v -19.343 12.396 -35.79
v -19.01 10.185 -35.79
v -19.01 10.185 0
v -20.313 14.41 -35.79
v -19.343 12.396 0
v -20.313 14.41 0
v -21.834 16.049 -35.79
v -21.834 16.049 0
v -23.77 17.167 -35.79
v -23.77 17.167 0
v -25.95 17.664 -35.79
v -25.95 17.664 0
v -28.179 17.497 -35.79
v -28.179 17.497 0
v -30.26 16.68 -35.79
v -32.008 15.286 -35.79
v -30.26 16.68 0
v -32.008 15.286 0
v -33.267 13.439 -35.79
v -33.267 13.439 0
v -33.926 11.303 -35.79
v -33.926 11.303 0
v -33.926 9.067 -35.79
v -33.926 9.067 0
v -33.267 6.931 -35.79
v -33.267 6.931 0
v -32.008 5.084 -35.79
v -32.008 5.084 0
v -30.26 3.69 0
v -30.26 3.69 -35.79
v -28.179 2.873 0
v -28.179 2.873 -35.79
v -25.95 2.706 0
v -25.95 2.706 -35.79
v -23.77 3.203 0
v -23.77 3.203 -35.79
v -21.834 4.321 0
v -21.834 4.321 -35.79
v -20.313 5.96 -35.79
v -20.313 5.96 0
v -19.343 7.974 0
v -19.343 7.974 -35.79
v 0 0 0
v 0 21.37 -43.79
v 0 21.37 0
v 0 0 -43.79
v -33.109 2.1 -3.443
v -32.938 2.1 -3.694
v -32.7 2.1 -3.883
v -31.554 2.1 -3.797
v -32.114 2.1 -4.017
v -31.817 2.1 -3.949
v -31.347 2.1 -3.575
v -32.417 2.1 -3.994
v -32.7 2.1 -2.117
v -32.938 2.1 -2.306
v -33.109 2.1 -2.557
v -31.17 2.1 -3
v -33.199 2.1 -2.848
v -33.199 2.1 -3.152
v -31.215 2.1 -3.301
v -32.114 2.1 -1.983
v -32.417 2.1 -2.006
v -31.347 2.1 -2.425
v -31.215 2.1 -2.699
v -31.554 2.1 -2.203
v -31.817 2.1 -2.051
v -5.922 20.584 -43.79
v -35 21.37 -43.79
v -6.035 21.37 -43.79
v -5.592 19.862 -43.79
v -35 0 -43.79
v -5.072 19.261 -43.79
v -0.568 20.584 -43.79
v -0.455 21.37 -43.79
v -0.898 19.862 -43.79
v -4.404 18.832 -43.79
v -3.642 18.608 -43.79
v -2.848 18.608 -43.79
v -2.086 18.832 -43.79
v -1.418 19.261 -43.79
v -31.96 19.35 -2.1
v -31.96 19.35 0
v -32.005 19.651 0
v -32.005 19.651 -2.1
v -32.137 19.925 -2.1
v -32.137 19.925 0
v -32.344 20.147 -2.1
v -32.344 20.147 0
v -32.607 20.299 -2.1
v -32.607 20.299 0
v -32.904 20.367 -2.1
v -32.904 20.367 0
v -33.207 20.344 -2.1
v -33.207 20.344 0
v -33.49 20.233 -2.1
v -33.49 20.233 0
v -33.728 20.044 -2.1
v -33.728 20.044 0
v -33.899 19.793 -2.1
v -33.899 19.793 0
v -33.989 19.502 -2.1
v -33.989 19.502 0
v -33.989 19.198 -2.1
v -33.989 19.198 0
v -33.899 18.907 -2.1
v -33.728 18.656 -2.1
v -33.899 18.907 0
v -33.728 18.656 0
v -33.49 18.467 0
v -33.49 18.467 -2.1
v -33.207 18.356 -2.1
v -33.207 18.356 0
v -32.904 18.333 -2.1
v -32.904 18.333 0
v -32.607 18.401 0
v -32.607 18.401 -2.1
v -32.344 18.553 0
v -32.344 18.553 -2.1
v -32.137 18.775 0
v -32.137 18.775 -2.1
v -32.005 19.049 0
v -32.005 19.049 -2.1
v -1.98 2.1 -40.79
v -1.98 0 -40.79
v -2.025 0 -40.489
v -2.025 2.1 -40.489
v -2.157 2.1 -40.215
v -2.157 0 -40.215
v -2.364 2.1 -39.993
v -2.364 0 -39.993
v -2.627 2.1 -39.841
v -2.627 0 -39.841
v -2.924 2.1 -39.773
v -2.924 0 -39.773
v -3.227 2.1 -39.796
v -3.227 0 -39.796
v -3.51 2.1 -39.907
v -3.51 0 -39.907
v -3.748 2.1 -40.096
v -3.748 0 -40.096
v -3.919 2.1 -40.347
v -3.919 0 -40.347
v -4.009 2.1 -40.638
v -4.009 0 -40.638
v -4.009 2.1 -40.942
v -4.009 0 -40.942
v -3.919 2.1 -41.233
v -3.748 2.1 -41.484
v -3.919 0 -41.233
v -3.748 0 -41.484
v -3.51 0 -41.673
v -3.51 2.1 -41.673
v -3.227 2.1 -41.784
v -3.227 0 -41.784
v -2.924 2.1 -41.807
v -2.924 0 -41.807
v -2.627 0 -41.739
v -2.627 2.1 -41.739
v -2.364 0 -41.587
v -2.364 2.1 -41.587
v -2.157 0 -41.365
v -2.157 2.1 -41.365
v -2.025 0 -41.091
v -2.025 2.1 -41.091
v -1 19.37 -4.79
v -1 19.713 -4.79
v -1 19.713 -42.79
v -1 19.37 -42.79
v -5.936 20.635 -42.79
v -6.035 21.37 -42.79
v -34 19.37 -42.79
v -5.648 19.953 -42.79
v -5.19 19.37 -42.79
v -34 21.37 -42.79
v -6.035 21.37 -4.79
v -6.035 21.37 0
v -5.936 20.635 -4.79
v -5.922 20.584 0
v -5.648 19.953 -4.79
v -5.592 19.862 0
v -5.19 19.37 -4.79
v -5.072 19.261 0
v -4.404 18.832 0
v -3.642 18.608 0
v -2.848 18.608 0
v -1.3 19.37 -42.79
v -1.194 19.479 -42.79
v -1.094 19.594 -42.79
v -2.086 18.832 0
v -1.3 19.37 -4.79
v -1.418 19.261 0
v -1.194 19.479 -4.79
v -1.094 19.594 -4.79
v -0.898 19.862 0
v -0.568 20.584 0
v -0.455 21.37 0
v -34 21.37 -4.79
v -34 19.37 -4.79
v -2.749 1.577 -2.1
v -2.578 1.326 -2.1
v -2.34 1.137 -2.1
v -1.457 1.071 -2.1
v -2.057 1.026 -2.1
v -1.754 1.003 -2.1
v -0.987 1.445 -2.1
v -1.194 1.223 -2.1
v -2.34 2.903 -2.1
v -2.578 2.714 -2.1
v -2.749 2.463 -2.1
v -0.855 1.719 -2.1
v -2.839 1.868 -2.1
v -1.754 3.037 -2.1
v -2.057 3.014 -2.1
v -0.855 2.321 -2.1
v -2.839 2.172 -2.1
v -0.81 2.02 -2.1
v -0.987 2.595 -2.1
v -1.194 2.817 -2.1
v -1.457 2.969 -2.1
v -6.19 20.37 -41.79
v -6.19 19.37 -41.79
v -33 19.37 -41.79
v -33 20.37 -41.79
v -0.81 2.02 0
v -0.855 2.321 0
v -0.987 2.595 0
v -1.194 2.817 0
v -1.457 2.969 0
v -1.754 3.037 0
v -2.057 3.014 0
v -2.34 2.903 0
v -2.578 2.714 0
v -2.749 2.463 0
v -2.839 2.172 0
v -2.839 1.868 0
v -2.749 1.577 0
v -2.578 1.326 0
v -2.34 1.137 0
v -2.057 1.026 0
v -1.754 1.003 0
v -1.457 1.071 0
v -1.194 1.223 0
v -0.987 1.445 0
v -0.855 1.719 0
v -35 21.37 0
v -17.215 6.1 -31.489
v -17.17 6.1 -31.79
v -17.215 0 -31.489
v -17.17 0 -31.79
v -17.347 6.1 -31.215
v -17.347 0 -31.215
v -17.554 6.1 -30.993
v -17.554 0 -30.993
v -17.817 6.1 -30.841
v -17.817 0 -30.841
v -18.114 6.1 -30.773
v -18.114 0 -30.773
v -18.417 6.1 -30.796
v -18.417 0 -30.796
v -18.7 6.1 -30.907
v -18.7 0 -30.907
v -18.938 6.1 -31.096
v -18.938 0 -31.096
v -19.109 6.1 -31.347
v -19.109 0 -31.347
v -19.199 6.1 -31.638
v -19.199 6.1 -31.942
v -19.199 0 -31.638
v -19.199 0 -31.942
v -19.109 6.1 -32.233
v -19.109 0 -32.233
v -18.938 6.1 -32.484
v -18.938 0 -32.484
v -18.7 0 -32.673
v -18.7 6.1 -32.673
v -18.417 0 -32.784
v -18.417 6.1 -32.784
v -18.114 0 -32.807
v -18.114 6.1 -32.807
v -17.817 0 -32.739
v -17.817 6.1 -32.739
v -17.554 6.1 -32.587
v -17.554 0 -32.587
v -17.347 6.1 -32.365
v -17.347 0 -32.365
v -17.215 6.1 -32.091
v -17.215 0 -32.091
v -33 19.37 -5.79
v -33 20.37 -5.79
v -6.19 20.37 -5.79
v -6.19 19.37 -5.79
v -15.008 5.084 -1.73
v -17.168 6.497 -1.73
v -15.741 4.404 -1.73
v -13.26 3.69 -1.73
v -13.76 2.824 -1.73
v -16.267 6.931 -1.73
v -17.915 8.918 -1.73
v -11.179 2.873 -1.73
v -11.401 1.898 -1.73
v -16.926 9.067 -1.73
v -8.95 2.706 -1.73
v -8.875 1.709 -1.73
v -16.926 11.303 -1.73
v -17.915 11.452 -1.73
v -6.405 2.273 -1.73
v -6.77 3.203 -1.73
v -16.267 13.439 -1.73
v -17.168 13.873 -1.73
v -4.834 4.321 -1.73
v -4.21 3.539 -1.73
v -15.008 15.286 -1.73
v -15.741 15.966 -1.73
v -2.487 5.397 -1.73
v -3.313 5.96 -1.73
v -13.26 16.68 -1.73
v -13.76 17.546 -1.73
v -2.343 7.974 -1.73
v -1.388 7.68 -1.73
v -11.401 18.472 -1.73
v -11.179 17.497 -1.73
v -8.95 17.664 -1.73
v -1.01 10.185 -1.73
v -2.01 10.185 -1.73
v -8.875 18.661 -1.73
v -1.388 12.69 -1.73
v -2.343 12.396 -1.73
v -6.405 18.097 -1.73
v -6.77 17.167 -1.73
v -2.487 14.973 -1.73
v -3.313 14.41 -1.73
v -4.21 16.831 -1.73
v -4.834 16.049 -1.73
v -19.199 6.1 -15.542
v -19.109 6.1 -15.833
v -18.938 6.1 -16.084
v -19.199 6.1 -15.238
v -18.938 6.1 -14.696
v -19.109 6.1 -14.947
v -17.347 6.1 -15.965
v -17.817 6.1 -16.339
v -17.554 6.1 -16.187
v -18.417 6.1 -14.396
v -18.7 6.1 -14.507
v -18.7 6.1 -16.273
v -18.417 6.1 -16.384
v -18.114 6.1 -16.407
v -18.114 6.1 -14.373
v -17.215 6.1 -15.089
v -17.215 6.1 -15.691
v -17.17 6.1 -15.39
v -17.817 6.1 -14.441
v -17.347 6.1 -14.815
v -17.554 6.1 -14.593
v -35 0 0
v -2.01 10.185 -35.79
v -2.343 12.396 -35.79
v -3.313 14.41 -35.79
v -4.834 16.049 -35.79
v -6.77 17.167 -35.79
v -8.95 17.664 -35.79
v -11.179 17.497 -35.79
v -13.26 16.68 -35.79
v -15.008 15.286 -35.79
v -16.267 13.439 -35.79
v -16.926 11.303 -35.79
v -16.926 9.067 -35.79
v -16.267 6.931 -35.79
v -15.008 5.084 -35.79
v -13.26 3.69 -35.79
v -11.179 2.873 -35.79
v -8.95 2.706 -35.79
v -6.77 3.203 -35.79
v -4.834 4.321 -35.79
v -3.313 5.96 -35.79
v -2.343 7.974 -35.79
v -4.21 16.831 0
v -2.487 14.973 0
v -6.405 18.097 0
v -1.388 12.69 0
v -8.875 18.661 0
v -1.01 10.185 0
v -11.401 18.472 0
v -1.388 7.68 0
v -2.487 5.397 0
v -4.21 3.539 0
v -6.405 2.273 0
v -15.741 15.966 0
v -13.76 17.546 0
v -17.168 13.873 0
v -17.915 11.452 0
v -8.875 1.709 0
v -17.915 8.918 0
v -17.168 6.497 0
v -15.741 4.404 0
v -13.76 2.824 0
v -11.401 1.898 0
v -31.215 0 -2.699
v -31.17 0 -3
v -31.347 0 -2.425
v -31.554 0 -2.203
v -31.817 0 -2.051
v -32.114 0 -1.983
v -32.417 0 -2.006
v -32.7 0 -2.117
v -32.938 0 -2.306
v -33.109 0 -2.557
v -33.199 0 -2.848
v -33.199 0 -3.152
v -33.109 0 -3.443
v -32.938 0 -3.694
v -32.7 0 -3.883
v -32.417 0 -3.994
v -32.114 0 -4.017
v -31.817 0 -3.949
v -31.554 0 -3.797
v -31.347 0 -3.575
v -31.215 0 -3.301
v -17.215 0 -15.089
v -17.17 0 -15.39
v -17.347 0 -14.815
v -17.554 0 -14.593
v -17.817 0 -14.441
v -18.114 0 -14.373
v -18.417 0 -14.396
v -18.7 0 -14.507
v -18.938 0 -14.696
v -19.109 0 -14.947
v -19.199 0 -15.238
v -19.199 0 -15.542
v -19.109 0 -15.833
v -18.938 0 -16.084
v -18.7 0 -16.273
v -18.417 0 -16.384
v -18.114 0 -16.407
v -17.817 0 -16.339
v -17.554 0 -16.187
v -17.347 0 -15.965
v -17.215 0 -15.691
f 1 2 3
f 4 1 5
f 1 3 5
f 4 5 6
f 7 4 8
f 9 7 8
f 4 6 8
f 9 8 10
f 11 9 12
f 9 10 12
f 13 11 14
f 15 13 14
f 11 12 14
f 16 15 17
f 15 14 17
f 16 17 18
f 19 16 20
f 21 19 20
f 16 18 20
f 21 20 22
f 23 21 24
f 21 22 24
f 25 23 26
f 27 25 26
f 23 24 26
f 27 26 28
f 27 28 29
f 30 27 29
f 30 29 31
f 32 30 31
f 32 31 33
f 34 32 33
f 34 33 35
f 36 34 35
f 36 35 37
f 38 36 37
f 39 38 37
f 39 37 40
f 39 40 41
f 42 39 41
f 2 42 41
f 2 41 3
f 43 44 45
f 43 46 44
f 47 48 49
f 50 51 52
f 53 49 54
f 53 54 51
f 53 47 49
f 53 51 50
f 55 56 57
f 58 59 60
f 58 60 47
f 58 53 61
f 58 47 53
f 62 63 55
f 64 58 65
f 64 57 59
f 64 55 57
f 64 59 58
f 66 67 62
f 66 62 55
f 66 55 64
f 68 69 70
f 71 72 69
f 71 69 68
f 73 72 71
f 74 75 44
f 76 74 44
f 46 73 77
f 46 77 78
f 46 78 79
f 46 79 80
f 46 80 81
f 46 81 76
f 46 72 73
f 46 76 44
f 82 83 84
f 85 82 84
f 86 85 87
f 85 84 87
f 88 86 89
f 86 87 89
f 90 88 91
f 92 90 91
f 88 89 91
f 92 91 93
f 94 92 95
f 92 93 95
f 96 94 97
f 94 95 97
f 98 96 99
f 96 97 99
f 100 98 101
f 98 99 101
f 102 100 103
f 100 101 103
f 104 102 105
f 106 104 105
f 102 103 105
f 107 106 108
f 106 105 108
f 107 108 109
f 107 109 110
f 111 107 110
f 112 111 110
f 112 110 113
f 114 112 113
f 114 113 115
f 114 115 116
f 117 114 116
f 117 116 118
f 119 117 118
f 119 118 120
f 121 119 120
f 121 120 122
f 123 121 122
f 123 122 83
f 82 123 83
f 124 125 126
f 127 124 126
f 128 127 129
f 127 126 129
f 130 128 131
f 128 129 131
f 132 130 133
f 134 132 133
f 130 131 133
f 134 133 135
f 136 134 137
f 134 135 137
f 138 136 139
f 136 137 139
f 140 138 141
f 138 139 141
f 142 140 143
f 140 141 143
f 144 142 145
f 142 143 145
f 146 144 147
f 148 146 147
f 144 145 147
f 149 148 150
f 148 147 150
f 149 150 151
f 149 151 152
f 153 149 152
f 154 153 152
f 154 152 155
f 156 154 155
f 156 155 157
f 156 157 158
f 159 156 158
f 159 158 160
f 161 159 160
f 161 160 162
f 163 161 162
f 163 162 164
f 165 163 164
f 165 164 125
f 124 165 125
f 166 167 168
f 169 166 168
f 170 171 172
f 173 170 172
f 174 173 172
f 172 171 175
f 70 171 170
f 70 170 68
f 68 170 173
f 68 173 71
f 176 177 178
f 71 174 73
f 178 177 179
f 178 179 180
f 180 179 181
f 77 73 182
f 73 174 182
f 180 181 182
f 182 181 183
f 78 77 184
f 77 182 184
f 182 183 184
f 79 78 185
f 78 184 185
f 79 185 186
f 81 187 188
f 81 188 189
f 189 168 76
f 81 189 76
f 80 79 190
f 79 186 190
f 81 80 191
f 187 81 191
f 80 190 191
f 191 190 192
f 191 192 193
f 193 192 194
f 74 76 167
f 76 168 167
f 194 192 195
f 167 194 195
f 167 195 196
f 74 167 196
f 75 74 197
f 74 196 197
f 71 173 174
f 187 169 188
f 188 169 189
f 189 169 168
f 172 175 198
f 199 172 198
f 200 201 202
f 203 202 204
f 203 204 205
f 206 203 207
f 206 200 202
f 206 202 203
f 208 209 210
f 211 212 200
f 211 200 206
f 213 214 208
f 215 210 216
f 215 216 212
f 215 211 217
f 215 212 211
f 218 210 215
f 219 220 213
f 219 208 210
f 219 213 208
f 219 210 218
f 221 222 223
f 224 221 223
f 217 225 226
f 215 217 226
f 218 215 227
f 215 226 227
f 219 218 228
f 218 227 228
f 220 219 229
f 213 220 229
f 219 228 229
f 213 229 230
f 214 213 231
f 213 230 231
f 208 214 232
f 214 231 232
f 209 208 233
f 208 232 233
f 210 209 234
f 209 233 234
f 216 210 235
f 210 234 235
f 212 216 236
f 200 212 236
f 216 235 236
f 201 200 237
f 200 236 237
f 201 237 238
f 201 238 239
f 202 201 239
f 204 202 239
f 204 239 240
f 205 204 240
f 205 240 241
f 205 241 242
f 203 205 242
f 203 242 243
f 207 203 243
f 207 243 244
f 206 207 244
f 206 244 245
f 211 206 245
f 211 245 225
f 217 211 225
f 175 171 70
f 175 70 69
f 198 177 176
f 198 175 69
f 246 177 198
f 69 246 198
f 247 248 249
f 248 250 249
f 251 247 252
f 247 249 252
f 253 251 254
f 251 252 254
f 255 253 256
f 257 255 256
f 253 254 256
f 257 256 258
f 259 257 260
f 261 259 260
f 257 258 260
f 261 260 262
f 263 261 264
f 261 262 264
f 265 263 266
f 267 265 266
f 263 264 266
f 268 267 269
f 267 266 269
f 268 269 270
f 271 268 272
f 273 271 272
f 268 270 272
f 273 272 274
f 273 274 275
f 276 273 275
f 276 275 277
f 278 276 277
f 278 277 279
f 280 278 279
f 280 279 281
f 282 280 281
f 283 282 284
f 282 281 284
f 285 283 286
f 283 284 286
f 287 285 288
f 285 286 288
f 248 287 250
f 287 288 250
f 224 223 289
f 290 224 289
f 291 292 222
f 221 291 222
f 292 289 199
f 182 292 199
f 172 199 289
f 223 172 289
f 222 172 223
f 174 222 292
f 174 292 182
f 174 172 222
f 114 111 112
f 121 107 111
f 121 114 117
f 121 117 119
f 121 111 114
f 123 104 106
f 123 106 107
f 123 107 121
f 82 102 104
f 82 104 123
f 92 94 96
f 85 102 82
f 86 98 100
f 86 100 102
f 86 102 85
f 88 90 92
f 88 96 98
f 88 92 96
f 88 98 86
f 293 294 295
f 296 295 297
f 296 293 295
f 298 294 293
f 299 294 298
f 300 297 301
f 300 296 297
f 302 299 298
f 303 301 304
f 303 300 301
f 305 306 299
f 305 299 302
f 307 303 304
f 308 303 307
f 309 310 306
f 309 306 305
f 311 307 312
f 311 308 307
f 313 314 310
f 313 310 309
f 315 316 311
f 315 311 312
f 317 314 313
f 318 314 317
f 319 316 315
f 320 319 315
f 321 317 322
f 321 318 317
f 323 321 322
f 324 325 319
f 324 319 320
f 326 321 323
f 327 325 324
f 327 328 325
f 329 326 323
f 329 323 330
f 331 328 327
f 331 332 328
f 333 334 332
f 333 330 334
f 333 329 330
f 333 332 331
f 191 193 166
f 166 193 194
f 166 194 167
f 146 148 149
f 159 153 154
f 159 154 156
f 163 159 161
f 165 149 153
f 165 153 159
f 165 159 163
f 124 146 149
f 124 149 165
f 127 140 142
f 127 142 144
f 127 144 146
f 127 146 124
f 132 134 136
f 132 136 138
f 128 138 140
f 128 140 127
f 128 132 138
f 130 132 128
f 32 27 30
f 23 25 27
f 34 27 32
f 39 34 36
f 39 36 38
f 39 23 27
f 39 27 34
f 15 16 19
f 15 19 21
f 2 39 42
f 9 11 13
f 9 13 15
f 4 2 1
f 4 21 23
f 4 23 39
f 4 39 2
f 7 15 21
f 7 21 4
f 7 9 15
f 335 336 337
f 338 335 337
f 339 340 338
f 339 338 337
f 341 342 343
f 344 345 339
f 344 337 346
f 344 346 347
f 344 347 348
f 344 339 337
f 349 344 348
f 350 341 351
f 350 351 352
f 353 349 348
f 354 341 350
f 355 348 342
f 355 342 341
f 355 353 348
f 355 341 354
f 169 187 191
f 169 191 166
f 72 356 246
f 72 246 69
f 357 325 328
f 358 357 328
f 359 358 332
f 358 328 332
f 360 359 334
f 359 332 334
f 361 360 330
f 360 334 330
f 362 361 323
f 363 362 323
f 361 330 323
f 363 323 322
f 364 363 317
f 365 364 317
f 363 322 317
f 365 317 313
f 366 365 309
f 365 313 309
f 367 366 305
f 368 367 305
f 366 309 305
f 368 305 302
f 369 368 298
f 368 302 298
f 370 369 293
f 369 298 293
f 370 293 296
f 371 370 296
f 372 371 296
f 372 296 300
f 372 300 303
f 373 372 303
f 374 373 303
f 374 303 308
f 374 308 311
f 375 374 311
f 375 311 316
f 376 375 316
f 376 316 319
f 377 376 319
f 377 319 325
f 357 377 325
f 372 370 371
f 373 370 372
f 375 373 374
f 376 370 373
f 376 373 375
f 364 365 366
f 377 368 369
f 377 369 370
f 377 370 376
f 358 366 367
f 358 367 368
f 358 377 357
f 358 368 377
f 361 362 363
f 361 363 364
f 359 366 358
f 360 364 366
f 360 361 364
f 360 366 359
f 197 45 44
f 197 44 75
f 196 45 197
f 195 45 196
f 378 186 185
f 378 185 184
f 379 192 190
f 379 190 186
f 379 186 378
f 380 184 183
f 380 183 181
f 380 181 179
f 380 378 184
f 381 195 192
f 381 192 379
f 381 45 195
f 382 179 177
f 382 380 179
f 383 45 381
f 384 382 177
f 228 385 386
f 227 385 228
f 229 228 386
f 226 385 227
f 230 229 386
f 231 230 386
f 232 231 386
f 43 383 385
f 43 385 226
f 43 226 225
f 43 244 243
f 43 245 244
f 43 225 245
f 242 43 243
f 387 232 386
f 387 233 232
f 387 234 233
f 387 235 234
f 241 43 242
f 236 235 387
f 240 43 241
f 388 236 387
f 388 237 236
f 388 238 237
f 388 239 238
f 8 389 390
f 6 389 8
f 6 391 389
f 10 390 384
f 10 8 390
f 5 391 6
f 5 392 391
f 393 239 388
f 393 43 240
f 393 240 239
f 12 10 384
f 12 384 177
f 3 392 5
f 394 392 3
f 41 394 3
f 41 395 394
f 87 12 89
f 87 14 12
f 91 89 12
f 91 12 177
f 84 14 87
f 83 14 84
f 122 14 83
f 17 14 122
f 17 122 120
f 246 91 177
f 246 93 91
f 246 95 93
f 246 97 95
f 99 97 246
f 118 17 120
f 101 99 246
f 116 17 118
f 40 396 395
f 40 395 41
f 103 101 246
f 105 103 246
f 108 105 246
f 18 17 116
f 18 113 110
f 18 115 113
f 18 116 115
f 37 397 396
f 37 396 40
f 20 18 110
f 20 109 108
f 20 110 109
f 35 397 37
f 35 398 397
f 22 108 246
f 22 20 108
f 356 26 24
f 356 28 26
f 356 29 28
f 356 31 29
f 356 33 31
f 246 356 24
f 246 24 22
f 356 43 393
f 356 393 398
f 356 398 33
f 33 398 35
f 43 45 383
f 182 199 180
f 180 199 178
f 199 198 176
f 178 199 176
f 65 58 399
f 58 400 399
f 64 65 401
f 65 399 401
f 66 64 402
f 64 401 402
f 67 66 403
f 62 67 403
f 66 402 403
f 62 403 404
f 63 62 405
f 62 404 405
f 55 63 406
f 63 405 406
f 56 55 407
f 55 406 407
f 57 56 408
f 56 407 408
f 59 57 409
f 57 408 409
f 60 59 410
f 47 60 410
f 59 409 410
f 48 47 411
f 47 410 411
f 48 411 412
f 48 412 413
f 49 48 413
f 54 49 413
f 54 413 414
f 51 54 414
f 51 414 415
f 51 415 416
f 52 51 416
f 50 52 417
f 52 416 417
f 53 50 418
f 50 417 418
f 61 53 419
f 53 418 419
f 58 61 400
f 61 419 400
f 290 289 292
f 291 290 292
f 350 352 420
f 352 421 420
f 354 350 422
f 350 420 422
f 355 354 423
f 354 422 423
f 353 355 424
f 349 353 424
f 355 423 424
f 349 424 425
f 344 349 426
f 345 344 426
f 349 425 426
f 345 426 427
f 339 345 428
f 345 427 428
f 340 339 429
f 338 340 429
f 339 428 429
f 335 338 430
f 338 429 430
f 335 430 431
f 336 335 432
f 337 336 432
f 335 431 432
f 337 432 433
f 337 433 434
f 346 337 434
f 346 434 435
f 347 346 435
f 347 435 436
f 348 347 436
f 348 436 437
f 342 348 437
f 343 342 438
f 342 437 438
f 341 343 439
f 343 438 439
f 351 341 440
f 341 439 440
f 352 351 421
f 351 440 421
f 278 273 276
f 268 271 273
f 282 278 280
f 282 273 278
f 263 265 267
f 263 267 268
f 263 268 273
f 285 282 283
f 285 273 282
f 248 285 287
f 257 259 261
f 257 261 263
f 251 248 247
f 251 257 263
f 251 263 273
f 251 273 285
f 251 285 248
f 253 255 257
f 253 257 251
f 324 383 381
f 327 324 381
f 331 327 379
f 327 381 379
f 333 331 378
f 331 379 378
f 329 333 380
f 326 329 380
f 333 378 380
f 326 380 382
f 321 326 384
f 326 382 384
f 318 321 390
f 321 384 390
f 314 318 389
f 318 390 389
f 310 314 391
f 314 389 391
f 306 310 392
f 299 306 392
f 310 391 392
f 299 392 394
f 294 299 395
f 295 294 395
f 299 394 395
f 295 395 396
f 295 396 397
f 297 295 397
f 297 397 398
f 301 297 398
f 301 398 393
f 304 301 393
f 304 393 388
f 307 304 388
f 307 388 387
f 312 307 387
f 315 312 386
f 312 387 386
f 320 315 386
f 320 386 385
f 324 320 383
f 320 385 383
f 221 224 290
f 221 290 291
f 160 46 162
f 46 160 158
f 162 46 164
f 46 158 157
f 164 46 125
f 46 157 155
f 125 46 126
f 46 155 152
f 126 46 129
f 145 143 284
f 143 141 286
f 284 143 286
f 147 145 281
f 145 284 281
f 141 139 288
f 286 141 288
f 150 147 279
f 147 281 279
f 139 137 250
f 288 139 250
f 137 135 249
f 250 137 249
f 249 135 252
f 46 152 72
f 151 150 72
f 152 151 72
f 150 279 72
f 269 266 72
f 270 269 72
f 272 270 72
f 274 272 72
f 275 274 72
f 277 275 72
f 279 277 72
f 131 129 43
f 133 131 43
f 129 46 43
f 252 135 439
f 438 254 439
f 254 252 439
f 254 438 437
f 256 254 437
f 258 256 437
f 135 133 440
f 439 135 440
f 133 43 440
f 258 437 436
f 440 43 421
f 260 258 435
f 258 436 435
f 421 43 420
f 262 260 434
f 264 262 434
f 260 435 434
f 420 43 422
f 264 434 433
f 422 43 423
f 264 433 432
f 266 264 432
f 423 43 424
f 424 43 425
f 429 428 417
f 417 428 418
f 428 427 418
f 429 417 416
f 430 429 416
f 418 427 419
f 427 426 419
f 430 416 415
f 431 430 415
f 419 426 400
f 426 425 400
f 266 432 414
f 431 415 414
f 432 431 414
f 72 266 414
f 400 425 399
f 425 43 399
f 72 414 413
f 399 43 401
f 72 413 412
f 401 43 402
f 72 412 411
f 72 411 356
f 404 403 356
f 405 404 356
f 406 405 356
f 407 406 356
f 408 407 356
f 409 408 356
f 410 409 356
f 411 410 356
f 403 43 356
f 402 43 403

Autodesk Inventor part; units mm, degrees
ref_plane "YZ Plane" through (0, 0, 0) normal (1, 0, 0) x (0, 1, 0)
ref_plane "XZ Plane" through (0, 0, 0) normal (0, 1, 0) x (-1, 0, 0)
ref_plane "XY Plane" through (0, 0, 0) normal (0, 0, 1) x (1, 0, 0)
sketch "Sketch1" plane through (0, 0, 0) normal (0, 1, 0) x (-1, 0, 0)
  line L0 (0, 0) -> (35, 0)
  line L1 (35, 0) -> (35, -43.79)
  line L2 (35, -43.79) -> (0, -43.79)
  line L3 (0, -43.79) -> (0, 0)
  dimension "d0" = 35
  dimension "d1" = 43.79
extrude "Extrusion1" add sketch "Sketch1" along normal blind 21.37
sketch "Sketch2" plane through (-35, 0, 0) normal (0, 0, 1) x (1, 0, 0)
  circle A0 centre (8.49, 10.185) radius 7.5
  circle A1 centre (25.49, 10.185) radius 7.5
  point P0 (35, 0)
  dimension "d4" = 15
  dimension "d5" = 15
extrude "Extrusion2" cut sketch "Sketch2" against normal blind 35.79
sketch "Sketch3" plane through (-35, 0, 0) normal (0, 0, 1) x (1, 0, 0)
  circle A0 centre (25.49, 10.185) radius 7.5 projected
  circle A1 centre (25.49, 10.185) radius 8.5
  point P0 (35, 0)
  dimension "d9" = 17
extrude "Extrusion3" cut sketch "Sketch3" against normal blind 1.73
sketch "Sketch4" plane through (-35, 0, 0) normal (0, 0, 1) x (1, 0, 0)
  circle A0 centre (2.02, 19.35) radius 1.02
  circle A1 centre (33.17, 2.02) radius 1.02
  point P0 (35, 0)
  dimension "d12" = 2.04
  dimension "d13" = 2.04
extrude "Extrusion4" cut sketch "Sketch4" against normal blind 2.1
sketch "Sketch5" plane through (0, 0, 0) normal (0, -1, 0) x (1, 0, 0)
  circle A0 centre (-32.19, -3) radius 1.02
  circle A1 centre (-3, -40.79) radius 1.02
  point P0 (0, 0)
  dimension "d17" = 2.04
  dimension "d23" = 2.04
extrude "Extrusion5" cut sketch "Sketch5" against normal blind 2.1
sketch "Sketch6" plane through (0, 0, 0) normal (0, -1, 0) x (1, 0, 0)
  circle A0 centre (-18.19, -15.39) radius 1.02
  circle A1 centre (-18.19, -31.79) radius 1.02
  point P0 (0, 0)
  dimension "d20" = 2.04
  dimension "d21" = 2.04
extrude "Extrusion6" cut sketch "Sketch6" against normal blind 6.1
sketch "Sketch10" plane through (0, 21.37, 0) normal (0, 1, 0) x (1, 0, 0)
  line L0 (-35, 43.79) -> (-35, 0) projected
  line L1 (0, 0) -> (0, 43.79) projected
  line L2 (-35, 43.79) -> (0, 43.79)
  line L3 (0, 43.79) -> (0, 3.79)
  line L4 (0, 3.79) -> (-35, 3.79)
  line L5 (-35, 3.79) -> (-35, 43.79)
  line L6 (-34, 4.79) -> (-1, 4.79)
  line L7 (-1, 4.79) -> (-1, 42.79)
  line L8 (-1, 42.79) -> (-34, 42.79)
  line L9 (-34, 42.79) -> (-34, 4.79)
  dimension "d30" = 40
  dimension "d31" = 1
extrude "Extrusion8" cut sketch "Sketch10" against normal blind 2 contours L9 L8 L7 L6
sketch "Sketch11" plane through (-35, 0, 0) normal (0, 0, 1) x (1, 0, 0)
  line L0 (35, 21.37) -> (0, 21.37) projected
  circle A0 centre (31.7551, 21.37) radius 2.79
  point P0 (35, 0)
  dimension "d34" = 5.58
extrude "Extrusion9" cut sketch "Sketch11" against normal through all
sketch "Sketch12" plane through (0, 19.37, 0) normal (0, 1, 0) x (1, 0, 0)
  line L0 (-34, 4.79) -> (-34, 42.79) projected
  line L1 (-5.1902, 4.79) -> (-5.1902, 42.79) projected
  line L2 (-34, 42.79) -> (-5.1902, 42.79)
  line L3 (-5.1902, 42.79) -> (-5.1902, 4.79)
  line L4 (-5.1902, 4.79) -> (-34, 4.79)
  line L5 (-34, 4.79) -> (-34, 42.79)
  line L6 (-33, 5.79) -> (-6.1902, 5.79)
  line L7 (-6.1902, 5.79) -> (-6.1902, 41.79)
  line L8 (-6.1902, 41.79) -> (-33, 41.79)
  line L9 (-33, 41.79) -> (-33, 5.79)
  point P0 (0, 0)
  dimension "d37" = 1
extrude "Extrusion10" add sketch "Sketch12" along normal blind 1 contours L9 L8 L7 L6
properties part number "Small LRF Real"
